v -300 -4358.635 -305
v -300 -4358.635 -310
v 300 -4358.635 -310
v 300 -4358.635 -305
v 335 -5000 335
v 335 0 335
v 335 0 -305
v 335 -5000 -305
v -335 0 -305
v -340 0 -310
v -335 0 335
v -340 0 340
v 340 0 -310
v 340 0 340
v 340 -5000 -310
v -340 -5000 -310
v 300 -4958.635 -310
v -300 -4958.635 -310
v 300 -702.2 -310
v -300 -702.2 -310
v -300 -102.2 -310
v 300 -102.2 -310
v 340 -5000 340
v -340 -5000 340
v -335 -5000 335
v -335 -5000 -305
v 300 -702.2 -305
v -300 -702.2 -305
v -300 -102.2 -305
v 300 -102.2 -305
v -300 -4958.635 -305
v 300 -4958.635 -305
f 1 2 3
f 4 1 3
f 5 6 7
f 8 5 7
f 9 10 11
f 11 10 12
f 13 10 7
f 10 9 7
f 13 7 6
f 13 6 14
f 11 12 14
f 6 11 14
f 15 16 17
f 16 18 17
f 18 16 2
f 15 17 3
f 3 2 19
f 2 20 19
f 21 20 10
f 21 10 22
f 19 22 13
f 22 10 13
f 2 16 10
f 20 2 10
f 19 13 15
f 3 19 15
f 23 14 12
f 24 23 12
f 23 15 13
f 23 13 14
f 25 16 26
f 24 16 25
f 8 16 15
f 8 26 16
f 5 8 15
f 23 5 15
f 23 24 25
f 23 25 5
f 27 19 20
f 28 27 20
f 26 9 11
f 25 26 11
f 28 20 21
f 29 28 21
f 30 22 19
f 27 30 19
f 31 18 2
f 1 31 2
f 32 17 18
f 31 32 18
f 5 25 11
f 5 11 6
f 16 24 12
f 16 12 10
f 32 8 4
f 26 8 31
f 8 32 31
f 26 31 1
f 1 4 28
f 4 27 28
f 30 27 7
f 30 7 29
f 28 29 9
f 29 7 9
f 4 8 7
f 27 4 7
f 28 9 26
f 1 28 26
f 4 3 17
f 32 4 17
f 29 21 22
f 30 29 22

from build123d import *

# Parameters (mm, degrees)
F1_DEPTH = 5000
F3_DEPTH = 25


with BuildPart() as f1:
    # F0 (on Front) → F1 (new body)
    with BuildSketch(Plane.XZ):
        Polygon((340, -310), (340, 0), (340, 340), (-340, 340), (-340, 0), (-340, -310), align=None)
        Polygon((335, 335), (335, 0), (335, -305), (-335, -305), (-335, 0), (-335, 335), align=None, mode=Mode.SUBTRACT)
    extrude(amount=F1_DEPTH)

    # F2 (on face) → F3 (cut)
    with BuildSketch(Plane(origin=(0, 0, -310), x_dir=(1, 0, 0), z_dir=(0, 0, -1))):
        Polygon((-300, 4358.634683), (0, 4358.634683), (300, 4358.634683), (300, 4958.634683), (0, 4958.634683), (-300, 4958.634683), align=None)
        Polygon((300, 702.200197), (0, 702.200197), (-300, 702.200197), (-300, 102.200197), (0, 102.200197), (300, 102.200197), align=None)
    extrude(amount=-F3_DEPTH, mode=Mode.SUBTRACT)


solid = f1.part
